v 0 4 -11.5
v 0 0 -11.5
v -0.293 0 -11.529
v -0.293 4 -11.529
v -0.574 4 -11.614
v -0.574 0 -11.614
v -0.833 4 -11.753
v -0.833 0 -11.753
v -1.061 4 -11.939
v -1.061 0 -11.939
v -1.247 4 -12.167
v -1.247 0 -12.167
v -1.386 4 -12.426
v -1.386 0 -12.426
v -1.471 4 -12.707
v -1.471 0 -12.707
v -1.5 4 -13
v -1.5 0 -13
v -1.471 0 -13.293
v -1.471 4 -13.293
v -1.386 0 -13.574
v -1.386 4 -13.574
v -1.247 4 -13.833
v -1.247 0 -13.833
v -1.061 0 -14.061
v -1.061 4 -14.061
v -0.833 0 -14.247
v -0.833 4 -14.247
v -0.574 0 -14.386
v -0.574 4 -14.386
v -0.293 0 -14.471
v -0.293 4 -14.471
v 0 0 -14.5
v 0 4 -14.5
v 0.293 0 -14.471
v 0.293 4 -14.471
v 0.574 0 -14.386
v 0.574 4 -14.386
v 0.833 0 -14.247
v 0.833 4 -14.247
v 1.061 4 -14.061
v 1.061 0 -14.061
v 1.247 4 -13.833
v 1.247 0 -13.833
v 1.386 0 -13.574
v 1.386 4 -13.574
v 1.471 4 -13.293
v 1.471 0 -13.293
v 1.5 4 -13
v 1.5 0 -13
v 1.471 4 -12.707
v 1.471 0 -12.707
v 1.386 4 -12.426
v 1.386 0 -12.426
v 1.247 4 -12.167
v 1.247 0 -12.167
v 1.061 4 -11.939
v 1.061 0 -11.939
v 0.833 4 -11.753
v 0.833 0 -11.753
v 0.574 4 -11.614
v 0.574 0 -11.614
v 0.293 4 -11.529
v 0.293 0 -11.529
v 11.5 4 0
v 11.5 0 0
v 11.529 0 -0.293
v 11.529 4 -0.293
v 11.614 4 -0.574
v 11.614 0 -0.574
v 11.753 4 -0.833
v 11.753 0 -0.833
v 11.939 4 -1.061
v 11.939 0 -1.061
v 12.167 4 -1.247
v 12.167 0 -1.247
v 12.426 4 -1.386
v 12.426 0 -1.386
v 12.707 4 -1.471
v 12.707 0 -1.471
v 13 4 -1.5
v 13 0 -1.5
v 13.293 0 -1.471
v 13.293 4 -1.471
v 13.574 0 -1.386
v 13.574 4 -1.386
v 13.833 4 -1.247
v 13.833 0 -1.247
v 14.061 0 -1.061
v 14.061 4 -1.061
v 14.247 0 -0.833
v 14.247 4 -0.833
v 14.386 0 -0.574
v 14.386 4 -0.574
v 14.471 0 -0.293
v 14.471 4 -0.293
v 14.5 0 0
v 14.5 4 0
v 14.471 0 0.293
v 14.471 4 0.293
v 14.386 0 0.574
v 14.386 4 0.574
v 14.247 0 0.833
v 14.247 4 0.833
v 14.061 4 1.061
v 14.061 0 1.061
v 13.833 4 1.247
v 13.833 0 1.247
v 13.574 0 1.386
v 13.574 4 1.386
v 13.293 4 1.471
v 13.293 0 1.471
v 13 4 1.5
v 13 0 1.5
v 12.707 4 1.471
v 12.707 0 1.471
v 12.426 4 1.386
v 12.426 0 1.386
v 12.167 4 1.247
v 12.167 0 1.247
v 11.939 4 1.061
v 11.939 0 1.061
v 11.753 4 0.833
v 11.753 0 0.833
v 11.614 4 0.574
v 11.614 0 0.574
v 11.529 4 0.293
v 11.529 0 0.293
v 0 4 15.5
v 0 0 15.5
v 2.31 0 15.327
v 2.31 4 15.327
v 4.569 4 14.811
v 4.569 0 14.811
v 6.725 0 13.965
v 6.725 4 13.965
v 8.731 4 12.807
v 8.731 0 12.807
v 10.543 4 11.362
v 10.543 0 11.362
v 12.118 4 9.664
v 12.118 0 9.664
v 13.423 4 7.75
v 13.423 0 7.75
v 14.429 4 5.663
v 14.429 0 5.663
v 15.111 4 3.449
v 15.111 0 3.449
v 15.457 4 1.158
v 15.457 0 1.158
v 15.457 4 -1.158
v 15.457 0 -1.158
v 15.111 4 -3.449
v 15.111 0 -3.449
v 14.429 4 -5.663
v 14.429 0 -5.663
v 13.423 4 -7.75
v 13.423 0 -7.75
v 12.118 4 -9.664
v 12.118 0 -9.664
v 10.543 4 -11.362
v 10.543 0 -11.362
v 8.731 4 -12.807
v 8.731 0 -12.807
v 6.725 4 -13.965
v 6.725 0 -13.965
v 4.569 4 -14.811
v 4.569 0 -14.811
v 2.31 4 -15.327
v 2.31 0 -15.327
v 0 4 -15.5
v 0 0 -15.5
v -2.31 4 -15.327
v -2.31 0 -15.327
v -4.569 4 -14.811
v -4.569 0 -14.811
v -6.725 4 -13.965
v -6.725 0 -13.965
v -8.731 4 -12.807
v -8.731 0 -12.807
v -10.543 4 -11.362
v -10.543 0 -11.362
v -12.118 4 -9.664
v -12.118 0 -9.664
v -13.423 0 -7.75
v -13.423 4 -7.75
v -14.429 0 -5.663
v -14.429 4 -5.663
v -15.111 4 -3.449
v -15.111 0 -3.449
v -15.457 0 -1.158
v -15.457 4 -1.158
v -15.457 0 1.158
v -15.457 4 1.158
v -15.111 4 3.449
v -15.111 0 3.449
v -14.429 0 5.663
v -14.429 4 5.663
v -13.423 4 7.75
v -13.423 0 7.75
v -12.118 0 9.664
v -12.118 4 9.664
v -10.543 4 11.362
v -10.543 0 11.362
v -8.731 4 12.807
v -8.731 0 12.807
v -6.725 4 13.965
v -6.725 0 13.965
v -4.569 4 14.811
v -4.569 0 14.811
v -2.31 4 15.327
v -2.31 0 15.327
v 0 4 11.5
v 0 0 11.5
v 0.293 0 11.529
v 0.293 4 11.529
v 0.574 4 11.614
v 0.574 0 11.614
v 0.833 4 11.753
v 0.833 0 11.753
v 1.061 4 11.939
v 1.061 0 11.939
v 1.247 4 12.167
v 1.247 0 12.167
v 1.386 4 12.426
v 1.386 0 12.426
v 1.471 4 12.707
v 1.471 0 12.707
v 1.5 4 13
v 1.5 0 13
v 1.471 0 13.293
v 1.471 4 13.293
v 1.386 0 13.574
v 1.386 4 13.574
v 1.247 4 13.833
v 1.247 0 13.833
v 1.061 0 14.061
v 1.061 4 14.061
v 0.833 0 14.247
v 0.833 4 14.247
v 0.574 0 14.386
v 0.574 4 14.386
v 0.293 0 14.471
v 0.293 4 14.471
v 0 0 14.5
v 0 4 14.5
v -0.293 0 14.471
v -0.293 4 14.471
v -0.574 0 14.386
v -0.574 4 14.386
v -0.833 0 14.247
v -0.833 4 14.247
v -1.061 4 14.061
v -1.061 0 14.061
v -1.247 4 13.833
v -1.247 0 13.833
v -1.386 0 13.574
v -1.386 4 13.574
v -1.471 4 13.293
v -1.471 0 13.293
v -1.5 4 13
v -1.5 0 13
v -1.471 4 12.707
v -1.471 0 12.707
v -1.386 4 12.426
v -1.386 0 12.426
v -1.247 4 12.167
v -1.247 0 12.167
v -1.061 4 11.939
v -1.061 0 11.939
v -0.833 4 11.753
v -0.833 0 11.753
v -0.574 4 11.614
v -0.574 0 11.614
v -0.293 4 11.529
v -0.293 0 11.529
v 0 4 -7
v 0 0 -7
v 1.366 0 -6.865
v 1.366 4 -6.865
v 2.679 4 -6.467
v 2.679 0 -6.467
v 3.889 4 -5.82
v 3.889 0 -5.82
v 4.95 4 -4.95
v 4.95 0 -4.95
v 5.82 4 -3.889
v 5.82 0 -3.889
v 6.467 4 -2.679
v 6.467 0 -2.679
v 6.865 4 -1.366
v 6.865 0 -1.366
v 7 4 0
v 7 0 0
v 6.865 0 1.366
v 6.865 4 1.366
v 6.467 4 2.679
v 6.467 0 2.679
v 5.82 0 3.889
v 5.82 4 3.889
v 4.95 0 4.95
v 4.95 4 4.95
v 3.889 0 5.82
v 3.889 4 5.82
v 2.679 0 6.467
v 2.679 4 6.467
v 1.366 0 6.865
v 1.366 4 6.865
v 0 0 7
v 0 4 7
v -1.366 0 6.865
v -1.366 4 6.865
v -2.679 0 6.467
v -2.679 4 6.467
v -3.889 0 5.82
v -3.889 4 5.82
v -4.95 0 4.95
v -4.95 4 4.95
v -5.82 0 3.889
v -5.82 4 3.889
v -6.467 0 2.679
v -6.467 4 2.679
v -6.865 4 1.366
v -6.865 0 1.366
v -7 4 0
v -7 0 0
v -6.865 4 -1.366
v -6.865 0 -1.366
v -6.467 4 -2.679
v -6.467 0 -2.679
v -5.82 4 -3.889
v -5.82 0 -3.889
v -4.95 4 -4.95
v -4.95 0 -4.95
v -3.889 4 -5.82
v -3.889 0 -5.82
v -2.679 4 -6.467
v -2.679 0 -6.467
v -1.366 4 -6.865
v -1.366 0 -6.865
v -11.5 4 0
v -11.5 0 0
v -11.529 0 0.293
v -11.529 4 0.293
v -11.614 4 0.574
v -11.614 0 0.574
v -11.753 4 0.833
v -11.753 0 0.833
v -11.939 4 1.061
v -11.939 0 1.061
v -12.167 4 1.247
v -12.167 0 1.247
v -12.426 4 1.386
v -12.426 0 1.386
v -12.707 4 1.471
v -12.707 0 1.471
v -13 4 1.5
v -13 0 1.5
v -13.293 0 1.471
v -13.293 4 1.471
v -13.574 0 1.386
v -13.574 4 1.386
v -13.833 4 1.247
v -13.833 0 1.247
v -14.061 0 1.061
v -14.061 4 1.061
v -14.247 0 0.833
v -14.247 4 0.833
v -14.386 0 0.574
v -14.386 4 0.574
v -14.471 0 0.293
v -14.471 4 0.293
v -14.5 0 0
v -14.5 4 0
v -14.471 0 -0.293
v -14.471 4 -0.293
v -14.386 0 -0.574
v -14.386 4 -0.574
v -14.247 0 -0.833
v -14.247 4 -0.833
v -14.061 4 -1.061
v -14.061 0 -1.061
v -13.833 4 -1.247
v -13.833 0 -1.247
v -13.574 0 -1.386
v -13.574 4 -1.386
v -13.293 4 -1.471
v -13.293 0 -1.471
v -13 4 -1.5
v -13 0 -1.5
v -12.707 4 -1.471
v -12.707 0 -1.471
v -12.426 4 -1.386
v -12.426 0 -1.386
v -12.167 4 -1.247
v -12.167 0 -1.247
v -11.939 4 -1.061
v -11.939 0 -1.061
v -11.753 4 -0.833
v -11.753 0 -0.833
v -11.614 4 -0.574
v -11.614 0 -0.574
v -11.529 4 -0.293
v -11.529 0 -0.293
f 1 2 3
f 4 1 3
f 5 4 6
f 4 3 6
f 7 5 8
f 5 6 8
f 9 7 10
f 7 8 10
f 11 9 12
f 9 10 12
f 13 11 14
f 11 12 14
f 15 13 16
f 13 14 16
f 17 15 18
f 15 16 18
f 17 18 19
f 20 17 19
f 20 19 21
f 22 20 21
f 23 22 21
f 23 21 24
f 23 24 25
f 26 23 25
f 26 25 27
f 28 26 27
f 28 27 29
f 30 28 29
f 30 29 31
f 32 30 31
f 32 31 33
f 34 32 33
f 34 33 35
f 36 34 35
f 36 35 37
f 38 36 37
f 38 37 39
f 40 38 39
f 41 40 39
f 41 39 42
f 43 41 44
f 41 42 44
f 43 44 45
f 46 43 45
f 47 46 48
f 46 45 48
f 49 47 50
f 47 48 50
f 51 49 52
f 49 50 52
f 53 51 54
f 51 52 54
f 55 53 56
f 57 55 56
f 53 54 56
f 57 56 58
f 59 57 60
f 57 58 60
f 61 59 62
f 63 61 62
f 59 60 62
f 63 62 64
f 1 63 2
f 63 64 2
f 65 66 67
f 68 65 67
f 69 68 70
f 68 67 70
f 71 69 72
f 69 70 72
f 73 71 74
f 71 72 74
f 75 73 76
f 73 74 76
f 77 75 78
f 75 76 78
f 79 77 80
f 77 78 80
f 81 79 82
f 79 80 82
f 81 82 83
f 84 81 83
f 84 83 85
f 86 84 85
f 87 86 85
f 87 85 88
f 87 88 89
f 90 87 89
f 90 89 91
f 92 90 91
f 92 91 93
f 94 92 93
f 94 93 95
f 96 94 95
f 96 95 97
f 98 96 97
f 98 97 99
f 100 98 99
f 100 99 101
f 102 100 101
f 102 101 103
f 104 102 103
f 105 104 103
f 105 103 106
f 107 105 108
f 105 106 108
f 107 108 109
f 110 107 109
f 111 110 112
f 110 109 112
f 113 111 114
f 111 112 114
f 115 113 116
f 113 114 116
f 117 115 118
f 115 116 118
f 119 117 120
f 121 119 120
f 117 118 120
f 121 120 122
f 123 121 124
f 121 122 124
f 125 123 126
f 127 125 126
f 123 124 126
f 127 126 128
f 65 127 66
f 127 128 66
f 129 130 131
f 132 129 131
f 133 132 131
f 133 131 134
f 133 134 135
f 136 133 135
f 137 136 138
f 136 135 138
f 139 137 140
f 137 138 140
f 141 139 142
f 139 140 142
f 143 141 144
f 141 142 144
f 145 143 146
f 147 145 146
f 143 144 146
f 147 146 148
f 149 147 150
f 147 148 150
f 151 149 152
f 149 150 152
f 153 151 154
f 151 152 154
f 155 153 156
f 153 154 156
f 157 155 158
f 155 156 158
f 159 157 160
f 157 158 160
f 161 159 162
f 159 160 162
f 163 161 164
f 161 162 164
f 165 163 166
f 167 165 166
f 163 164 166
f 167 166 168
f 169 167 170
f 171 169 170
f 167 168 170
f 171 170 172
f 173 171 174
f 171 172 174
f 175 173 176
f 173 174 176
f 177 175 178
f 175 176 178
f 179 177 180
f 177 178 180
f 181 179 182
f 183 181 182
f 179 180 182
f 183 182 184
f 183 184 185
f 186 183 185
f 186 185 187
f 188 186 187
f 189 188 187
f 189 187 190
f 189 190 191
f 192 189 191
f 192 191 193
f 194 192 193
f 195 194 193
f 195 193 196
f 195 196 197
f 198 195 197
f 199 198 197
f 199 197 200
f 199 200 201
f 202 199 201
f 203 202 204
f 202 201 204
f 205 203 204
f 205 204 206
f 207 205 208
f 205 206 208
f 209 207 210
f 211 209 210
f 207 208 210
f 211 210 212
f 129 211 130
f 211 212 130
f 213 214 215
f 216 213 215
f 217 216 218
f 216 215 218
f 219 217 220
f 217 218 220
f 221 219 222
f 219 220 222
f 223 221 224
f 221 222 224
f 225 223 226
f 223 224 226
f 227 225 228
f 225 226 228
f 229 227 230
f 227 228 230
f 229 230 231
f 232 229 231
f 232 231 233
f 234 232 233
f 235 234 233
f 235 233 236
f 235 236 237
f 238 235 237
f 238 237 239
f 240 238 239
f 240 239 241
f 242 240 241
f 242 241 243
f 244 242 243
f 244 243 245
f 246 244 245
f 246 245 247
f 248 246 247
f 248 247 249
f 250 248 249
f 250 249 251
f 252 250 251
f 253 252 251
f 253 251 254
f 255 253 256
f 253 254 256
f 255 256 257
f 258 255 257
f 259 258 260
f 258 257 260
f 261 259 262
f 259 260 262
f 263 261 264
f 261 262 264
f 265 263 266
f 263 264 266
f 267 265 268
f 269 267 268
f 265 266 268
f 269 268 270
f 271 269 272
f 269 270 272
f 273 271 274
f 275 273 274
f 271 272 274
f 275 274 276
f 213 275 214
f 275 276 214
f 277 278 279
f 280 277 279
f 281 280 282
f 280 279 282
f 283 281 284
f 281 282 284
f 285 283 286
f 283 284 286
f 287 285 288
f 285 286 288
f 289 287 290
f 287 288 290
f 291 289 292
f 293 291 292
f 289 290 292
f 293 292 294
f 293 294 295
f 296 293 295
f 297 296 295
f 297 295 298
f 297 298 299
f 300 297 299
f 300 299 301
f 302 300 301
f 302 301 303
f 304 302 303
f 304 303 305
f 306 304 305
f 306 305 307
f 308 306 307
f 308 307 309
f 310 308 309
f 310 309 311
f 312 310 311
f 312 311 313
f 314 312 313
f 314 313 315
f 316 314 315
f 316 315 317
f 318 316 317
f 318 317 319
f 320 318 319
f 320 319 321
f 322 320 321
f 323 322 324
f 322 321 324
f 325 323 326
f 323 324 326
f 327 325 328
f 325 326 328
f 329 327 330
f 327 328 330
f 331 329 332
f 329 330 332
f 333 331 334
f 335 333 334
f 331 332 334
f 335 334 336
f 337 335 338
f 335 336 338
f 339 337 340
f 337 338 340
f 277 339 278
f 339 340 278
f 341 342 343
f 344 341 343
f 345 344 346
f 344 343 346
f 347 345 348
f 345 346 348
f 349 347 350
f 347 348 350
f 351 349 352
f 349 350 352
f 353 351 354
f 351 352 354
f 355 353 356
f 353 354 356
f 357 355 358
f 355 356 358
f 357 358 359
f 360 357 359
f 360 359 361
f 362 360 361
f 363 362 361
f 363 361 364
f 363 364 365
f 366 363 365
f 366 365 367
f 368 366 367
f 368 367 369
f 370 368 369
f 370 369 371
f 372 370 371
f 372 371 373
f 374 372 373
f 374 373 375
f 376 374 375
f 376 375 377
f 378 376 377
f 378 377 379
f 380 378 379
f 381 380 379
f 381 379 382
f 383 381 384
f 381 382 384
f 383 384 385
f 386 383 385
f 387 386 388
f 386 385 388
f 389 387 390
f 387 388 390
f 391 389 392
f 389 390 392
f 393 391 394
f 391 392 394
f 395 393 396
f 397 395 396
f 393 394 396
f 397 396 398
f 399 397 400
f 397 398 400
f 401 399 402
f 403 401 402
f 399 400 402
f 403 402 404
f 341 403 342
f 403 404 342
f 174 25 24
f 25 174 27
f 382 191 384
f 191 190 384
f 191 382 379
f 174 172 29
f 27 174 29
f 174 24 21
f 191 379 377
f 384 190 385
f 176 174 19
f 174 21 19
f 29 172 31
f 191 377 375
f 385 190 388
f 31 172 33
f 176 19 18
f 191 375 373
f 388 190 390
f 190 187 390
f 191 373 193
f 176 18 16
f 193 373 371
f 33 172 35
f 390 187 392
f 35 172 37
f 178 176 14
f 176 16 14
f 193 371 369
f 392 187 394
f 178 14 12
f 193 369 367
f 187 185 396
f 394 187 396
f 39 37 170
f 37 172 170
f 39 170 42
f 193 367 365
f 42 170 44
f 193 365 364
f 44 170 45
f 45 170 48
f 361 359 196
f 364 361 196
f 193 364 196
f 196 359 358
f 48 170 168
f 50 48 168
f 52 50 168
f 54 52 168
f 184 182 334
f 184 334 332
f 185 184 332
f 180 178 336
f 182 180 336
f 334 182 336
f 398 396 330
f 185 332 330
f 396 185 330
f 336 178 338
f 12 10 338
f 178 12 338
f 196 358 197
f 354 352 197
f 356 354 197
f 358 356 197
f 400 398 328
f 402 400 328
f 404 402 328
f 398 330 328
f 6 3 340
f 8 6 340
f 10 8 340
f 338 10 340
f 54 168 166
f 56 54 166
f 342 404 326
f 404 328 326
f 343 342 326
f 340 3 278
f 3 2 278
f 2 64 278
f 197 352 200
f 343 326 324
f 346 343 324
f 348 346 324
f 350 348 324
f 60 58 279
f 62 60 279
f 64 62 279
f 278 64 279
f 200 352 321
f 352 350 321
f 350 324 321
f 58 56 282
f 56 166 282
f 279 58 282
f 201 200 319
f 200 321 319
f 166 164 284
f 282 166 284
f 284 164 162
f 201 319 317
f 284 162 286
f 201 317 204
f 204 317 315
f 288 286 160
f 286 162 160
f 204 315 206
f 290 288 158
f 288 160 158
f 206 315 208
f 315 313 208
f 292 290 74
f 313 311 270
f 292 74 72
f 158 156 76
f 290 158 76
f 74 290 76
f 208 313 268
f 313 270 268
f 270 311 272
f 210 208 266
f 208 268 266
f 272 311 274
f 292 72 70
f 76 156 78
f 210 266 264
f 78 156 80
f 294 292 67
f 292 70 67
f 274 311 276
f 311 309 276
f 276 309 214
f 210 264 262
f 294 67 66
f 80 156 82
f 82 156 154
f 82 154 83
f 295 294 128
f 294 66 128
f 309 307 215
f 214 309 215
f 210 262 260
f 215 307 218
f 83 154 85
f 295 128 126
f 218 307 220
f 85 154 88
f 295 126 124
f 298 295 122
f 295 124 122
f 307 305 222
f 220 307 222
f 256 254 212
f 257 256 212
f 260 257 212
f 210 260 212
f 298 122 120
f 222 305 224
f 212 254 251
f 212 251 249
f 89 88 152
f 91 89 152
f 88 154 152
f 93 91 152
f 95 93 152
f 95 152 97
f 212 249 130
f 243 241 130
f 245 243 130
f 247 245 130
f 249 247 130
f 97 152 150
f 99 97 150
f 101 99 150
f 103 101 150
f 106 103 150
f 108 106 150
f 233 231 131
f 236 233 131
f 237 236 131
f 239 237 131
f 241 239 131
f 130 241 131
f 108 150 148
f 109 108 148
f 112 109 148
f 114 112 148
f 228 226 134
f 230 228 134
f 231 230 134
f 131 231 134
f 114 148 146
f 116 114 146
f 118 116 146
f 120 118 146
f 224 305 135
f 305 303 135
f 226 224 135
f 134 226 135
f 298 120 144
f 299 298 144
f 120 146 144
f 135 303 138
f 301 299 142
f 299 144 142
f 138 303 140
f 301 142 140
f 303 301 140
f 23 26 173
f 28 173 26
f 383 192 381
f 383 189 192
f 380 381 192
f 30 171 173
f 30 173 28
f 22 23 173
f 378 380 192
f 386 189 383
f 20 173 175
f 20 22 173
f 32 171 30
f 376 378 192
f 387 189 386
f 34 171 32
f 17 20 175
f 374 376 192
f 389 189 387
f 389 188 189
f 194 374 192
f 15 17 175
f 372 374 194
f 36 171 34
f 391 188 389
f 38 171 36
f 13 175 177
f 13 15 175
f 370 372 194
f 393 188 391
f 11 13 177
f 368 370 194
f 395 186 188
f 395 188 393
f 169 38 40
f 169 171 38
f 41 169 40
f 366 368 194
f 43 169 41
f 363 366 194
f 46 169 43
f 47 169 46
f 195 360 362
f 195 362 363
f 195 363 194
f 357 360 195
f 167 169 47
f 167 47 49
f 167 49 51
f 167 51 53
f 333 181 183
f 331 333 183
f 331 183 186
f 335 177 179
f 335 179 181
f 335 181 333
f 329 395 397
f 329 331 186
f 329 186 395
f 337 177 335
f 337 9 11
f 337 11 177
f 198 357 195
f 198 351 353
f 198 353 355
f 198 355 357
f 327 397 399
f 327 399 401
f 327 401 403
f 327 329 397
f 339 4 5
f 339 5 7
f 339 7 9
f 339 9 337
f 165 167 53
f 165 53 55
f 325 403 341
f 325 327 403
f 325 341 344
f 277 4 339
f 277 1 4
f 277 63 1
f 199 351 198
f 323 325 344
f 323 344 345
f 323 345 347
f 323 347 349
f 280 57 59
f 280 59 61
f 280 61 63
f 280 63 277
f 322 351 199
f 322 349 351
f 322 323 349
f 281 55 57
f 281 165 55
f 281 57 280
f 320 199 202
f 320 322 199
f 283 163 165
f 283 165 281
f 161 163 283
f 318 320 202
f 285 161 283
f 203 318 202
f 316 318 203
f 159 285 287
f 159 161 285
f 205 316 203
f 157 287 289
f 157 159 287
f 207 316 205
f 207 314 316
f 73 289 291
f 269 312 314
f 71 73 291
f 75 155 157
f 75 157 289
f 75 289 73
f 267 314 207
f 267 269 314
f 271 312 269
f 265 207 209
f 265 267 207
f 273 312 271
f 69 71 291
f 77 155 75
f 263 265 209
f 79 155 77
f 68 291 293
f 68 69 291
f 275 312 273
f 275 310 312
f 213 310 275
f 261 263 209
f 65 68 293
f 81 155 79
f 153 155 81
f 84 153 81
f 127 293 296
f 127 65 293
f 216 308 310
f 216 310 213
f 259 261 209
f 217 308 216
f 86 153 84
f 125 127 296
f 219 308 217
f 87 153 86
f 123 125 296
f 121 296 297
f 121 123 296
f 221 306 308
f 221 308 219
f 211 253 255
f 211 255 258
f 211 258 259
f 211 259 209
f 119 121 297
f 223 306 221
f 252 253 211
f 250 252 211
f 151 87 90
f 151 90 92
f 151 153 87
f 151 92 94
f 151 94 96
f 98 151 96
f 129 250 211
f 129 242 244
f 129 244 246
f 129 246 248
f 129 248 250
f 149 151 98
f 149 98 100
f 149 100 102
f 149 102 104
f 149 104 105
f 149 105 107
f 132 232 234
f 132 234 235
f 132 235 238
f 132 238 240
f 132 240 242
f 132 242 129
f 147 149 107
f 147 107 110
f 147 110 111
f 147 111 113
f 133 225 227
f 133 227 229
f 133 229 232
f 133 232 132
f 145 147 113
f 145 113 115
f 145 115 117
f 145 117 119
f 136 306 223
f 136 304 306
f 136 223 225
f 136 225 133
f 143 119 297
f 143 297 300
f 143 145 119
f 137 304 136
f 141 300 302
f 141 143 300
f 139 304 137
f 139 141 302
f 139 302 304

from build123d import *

# Parameters (mm, degrees)
SKETCH1_R           = 15.5
BOSS_EXTRUDE1_DEPTH = 4
SKETCH2_R           = 7
CENTER_HOLE_DEPTH   = 23.282279955
SKETCH3_R           = 1.5
M2_5_HOLE_DEPTH     = 23.282279955
CIRPATTERN1_COUNT   = 4


with BuildPart() as part:
    # Sketch1 → Boss-Extrude1 (new body)
    with BuildSketch(Plane(origin=(0, 0, 0), x_dir=(1, 0, 0), z_dir=(0, 1, 0))):
        with Locations(Location((0, 0, 0), (0, 0, 270))):
            Circle(SKETCH1_R)
    extrude(amount=BOSS_EXTRUDE1_DEPTH)

    # Sketch2 → center hole (cut, through all)
    with BuildSketch(Plane.XZ):
        with Locations(Location((0, 0, 0), (0, 0, 270))):
            Circle(SKETCH2_R)
    extrude(amount=-CENTER_HOLE_DEPTH, mode=Mode.SUBTRACT)

    # Sketch3 → M2.5 hole (cut, through all)
    with BuildSketch(Plane.XZ):
        with Locations(Location((0, 13, 0), (0, 0, 270))):
            Circle(SKETCH3_R)
    m2_5_hole = extrude(amount=-M2_5_HOLE_DEPTH, mode=Mode.SUBTRACT)

    # CirPattern1: M2.5 hole ×4 about axis
    cirpattern1_axis = Axis((0, 0, 0), (0, 1, 0))
    for i in range(1, CIRPATTERN1_COUNT):
        add(m2_5_hole.rotate(cirpattern1_axis, i * 360 / CIRPATTERN1_COUNT), mode=Mode.SUBTRACT)


solid = part.part
